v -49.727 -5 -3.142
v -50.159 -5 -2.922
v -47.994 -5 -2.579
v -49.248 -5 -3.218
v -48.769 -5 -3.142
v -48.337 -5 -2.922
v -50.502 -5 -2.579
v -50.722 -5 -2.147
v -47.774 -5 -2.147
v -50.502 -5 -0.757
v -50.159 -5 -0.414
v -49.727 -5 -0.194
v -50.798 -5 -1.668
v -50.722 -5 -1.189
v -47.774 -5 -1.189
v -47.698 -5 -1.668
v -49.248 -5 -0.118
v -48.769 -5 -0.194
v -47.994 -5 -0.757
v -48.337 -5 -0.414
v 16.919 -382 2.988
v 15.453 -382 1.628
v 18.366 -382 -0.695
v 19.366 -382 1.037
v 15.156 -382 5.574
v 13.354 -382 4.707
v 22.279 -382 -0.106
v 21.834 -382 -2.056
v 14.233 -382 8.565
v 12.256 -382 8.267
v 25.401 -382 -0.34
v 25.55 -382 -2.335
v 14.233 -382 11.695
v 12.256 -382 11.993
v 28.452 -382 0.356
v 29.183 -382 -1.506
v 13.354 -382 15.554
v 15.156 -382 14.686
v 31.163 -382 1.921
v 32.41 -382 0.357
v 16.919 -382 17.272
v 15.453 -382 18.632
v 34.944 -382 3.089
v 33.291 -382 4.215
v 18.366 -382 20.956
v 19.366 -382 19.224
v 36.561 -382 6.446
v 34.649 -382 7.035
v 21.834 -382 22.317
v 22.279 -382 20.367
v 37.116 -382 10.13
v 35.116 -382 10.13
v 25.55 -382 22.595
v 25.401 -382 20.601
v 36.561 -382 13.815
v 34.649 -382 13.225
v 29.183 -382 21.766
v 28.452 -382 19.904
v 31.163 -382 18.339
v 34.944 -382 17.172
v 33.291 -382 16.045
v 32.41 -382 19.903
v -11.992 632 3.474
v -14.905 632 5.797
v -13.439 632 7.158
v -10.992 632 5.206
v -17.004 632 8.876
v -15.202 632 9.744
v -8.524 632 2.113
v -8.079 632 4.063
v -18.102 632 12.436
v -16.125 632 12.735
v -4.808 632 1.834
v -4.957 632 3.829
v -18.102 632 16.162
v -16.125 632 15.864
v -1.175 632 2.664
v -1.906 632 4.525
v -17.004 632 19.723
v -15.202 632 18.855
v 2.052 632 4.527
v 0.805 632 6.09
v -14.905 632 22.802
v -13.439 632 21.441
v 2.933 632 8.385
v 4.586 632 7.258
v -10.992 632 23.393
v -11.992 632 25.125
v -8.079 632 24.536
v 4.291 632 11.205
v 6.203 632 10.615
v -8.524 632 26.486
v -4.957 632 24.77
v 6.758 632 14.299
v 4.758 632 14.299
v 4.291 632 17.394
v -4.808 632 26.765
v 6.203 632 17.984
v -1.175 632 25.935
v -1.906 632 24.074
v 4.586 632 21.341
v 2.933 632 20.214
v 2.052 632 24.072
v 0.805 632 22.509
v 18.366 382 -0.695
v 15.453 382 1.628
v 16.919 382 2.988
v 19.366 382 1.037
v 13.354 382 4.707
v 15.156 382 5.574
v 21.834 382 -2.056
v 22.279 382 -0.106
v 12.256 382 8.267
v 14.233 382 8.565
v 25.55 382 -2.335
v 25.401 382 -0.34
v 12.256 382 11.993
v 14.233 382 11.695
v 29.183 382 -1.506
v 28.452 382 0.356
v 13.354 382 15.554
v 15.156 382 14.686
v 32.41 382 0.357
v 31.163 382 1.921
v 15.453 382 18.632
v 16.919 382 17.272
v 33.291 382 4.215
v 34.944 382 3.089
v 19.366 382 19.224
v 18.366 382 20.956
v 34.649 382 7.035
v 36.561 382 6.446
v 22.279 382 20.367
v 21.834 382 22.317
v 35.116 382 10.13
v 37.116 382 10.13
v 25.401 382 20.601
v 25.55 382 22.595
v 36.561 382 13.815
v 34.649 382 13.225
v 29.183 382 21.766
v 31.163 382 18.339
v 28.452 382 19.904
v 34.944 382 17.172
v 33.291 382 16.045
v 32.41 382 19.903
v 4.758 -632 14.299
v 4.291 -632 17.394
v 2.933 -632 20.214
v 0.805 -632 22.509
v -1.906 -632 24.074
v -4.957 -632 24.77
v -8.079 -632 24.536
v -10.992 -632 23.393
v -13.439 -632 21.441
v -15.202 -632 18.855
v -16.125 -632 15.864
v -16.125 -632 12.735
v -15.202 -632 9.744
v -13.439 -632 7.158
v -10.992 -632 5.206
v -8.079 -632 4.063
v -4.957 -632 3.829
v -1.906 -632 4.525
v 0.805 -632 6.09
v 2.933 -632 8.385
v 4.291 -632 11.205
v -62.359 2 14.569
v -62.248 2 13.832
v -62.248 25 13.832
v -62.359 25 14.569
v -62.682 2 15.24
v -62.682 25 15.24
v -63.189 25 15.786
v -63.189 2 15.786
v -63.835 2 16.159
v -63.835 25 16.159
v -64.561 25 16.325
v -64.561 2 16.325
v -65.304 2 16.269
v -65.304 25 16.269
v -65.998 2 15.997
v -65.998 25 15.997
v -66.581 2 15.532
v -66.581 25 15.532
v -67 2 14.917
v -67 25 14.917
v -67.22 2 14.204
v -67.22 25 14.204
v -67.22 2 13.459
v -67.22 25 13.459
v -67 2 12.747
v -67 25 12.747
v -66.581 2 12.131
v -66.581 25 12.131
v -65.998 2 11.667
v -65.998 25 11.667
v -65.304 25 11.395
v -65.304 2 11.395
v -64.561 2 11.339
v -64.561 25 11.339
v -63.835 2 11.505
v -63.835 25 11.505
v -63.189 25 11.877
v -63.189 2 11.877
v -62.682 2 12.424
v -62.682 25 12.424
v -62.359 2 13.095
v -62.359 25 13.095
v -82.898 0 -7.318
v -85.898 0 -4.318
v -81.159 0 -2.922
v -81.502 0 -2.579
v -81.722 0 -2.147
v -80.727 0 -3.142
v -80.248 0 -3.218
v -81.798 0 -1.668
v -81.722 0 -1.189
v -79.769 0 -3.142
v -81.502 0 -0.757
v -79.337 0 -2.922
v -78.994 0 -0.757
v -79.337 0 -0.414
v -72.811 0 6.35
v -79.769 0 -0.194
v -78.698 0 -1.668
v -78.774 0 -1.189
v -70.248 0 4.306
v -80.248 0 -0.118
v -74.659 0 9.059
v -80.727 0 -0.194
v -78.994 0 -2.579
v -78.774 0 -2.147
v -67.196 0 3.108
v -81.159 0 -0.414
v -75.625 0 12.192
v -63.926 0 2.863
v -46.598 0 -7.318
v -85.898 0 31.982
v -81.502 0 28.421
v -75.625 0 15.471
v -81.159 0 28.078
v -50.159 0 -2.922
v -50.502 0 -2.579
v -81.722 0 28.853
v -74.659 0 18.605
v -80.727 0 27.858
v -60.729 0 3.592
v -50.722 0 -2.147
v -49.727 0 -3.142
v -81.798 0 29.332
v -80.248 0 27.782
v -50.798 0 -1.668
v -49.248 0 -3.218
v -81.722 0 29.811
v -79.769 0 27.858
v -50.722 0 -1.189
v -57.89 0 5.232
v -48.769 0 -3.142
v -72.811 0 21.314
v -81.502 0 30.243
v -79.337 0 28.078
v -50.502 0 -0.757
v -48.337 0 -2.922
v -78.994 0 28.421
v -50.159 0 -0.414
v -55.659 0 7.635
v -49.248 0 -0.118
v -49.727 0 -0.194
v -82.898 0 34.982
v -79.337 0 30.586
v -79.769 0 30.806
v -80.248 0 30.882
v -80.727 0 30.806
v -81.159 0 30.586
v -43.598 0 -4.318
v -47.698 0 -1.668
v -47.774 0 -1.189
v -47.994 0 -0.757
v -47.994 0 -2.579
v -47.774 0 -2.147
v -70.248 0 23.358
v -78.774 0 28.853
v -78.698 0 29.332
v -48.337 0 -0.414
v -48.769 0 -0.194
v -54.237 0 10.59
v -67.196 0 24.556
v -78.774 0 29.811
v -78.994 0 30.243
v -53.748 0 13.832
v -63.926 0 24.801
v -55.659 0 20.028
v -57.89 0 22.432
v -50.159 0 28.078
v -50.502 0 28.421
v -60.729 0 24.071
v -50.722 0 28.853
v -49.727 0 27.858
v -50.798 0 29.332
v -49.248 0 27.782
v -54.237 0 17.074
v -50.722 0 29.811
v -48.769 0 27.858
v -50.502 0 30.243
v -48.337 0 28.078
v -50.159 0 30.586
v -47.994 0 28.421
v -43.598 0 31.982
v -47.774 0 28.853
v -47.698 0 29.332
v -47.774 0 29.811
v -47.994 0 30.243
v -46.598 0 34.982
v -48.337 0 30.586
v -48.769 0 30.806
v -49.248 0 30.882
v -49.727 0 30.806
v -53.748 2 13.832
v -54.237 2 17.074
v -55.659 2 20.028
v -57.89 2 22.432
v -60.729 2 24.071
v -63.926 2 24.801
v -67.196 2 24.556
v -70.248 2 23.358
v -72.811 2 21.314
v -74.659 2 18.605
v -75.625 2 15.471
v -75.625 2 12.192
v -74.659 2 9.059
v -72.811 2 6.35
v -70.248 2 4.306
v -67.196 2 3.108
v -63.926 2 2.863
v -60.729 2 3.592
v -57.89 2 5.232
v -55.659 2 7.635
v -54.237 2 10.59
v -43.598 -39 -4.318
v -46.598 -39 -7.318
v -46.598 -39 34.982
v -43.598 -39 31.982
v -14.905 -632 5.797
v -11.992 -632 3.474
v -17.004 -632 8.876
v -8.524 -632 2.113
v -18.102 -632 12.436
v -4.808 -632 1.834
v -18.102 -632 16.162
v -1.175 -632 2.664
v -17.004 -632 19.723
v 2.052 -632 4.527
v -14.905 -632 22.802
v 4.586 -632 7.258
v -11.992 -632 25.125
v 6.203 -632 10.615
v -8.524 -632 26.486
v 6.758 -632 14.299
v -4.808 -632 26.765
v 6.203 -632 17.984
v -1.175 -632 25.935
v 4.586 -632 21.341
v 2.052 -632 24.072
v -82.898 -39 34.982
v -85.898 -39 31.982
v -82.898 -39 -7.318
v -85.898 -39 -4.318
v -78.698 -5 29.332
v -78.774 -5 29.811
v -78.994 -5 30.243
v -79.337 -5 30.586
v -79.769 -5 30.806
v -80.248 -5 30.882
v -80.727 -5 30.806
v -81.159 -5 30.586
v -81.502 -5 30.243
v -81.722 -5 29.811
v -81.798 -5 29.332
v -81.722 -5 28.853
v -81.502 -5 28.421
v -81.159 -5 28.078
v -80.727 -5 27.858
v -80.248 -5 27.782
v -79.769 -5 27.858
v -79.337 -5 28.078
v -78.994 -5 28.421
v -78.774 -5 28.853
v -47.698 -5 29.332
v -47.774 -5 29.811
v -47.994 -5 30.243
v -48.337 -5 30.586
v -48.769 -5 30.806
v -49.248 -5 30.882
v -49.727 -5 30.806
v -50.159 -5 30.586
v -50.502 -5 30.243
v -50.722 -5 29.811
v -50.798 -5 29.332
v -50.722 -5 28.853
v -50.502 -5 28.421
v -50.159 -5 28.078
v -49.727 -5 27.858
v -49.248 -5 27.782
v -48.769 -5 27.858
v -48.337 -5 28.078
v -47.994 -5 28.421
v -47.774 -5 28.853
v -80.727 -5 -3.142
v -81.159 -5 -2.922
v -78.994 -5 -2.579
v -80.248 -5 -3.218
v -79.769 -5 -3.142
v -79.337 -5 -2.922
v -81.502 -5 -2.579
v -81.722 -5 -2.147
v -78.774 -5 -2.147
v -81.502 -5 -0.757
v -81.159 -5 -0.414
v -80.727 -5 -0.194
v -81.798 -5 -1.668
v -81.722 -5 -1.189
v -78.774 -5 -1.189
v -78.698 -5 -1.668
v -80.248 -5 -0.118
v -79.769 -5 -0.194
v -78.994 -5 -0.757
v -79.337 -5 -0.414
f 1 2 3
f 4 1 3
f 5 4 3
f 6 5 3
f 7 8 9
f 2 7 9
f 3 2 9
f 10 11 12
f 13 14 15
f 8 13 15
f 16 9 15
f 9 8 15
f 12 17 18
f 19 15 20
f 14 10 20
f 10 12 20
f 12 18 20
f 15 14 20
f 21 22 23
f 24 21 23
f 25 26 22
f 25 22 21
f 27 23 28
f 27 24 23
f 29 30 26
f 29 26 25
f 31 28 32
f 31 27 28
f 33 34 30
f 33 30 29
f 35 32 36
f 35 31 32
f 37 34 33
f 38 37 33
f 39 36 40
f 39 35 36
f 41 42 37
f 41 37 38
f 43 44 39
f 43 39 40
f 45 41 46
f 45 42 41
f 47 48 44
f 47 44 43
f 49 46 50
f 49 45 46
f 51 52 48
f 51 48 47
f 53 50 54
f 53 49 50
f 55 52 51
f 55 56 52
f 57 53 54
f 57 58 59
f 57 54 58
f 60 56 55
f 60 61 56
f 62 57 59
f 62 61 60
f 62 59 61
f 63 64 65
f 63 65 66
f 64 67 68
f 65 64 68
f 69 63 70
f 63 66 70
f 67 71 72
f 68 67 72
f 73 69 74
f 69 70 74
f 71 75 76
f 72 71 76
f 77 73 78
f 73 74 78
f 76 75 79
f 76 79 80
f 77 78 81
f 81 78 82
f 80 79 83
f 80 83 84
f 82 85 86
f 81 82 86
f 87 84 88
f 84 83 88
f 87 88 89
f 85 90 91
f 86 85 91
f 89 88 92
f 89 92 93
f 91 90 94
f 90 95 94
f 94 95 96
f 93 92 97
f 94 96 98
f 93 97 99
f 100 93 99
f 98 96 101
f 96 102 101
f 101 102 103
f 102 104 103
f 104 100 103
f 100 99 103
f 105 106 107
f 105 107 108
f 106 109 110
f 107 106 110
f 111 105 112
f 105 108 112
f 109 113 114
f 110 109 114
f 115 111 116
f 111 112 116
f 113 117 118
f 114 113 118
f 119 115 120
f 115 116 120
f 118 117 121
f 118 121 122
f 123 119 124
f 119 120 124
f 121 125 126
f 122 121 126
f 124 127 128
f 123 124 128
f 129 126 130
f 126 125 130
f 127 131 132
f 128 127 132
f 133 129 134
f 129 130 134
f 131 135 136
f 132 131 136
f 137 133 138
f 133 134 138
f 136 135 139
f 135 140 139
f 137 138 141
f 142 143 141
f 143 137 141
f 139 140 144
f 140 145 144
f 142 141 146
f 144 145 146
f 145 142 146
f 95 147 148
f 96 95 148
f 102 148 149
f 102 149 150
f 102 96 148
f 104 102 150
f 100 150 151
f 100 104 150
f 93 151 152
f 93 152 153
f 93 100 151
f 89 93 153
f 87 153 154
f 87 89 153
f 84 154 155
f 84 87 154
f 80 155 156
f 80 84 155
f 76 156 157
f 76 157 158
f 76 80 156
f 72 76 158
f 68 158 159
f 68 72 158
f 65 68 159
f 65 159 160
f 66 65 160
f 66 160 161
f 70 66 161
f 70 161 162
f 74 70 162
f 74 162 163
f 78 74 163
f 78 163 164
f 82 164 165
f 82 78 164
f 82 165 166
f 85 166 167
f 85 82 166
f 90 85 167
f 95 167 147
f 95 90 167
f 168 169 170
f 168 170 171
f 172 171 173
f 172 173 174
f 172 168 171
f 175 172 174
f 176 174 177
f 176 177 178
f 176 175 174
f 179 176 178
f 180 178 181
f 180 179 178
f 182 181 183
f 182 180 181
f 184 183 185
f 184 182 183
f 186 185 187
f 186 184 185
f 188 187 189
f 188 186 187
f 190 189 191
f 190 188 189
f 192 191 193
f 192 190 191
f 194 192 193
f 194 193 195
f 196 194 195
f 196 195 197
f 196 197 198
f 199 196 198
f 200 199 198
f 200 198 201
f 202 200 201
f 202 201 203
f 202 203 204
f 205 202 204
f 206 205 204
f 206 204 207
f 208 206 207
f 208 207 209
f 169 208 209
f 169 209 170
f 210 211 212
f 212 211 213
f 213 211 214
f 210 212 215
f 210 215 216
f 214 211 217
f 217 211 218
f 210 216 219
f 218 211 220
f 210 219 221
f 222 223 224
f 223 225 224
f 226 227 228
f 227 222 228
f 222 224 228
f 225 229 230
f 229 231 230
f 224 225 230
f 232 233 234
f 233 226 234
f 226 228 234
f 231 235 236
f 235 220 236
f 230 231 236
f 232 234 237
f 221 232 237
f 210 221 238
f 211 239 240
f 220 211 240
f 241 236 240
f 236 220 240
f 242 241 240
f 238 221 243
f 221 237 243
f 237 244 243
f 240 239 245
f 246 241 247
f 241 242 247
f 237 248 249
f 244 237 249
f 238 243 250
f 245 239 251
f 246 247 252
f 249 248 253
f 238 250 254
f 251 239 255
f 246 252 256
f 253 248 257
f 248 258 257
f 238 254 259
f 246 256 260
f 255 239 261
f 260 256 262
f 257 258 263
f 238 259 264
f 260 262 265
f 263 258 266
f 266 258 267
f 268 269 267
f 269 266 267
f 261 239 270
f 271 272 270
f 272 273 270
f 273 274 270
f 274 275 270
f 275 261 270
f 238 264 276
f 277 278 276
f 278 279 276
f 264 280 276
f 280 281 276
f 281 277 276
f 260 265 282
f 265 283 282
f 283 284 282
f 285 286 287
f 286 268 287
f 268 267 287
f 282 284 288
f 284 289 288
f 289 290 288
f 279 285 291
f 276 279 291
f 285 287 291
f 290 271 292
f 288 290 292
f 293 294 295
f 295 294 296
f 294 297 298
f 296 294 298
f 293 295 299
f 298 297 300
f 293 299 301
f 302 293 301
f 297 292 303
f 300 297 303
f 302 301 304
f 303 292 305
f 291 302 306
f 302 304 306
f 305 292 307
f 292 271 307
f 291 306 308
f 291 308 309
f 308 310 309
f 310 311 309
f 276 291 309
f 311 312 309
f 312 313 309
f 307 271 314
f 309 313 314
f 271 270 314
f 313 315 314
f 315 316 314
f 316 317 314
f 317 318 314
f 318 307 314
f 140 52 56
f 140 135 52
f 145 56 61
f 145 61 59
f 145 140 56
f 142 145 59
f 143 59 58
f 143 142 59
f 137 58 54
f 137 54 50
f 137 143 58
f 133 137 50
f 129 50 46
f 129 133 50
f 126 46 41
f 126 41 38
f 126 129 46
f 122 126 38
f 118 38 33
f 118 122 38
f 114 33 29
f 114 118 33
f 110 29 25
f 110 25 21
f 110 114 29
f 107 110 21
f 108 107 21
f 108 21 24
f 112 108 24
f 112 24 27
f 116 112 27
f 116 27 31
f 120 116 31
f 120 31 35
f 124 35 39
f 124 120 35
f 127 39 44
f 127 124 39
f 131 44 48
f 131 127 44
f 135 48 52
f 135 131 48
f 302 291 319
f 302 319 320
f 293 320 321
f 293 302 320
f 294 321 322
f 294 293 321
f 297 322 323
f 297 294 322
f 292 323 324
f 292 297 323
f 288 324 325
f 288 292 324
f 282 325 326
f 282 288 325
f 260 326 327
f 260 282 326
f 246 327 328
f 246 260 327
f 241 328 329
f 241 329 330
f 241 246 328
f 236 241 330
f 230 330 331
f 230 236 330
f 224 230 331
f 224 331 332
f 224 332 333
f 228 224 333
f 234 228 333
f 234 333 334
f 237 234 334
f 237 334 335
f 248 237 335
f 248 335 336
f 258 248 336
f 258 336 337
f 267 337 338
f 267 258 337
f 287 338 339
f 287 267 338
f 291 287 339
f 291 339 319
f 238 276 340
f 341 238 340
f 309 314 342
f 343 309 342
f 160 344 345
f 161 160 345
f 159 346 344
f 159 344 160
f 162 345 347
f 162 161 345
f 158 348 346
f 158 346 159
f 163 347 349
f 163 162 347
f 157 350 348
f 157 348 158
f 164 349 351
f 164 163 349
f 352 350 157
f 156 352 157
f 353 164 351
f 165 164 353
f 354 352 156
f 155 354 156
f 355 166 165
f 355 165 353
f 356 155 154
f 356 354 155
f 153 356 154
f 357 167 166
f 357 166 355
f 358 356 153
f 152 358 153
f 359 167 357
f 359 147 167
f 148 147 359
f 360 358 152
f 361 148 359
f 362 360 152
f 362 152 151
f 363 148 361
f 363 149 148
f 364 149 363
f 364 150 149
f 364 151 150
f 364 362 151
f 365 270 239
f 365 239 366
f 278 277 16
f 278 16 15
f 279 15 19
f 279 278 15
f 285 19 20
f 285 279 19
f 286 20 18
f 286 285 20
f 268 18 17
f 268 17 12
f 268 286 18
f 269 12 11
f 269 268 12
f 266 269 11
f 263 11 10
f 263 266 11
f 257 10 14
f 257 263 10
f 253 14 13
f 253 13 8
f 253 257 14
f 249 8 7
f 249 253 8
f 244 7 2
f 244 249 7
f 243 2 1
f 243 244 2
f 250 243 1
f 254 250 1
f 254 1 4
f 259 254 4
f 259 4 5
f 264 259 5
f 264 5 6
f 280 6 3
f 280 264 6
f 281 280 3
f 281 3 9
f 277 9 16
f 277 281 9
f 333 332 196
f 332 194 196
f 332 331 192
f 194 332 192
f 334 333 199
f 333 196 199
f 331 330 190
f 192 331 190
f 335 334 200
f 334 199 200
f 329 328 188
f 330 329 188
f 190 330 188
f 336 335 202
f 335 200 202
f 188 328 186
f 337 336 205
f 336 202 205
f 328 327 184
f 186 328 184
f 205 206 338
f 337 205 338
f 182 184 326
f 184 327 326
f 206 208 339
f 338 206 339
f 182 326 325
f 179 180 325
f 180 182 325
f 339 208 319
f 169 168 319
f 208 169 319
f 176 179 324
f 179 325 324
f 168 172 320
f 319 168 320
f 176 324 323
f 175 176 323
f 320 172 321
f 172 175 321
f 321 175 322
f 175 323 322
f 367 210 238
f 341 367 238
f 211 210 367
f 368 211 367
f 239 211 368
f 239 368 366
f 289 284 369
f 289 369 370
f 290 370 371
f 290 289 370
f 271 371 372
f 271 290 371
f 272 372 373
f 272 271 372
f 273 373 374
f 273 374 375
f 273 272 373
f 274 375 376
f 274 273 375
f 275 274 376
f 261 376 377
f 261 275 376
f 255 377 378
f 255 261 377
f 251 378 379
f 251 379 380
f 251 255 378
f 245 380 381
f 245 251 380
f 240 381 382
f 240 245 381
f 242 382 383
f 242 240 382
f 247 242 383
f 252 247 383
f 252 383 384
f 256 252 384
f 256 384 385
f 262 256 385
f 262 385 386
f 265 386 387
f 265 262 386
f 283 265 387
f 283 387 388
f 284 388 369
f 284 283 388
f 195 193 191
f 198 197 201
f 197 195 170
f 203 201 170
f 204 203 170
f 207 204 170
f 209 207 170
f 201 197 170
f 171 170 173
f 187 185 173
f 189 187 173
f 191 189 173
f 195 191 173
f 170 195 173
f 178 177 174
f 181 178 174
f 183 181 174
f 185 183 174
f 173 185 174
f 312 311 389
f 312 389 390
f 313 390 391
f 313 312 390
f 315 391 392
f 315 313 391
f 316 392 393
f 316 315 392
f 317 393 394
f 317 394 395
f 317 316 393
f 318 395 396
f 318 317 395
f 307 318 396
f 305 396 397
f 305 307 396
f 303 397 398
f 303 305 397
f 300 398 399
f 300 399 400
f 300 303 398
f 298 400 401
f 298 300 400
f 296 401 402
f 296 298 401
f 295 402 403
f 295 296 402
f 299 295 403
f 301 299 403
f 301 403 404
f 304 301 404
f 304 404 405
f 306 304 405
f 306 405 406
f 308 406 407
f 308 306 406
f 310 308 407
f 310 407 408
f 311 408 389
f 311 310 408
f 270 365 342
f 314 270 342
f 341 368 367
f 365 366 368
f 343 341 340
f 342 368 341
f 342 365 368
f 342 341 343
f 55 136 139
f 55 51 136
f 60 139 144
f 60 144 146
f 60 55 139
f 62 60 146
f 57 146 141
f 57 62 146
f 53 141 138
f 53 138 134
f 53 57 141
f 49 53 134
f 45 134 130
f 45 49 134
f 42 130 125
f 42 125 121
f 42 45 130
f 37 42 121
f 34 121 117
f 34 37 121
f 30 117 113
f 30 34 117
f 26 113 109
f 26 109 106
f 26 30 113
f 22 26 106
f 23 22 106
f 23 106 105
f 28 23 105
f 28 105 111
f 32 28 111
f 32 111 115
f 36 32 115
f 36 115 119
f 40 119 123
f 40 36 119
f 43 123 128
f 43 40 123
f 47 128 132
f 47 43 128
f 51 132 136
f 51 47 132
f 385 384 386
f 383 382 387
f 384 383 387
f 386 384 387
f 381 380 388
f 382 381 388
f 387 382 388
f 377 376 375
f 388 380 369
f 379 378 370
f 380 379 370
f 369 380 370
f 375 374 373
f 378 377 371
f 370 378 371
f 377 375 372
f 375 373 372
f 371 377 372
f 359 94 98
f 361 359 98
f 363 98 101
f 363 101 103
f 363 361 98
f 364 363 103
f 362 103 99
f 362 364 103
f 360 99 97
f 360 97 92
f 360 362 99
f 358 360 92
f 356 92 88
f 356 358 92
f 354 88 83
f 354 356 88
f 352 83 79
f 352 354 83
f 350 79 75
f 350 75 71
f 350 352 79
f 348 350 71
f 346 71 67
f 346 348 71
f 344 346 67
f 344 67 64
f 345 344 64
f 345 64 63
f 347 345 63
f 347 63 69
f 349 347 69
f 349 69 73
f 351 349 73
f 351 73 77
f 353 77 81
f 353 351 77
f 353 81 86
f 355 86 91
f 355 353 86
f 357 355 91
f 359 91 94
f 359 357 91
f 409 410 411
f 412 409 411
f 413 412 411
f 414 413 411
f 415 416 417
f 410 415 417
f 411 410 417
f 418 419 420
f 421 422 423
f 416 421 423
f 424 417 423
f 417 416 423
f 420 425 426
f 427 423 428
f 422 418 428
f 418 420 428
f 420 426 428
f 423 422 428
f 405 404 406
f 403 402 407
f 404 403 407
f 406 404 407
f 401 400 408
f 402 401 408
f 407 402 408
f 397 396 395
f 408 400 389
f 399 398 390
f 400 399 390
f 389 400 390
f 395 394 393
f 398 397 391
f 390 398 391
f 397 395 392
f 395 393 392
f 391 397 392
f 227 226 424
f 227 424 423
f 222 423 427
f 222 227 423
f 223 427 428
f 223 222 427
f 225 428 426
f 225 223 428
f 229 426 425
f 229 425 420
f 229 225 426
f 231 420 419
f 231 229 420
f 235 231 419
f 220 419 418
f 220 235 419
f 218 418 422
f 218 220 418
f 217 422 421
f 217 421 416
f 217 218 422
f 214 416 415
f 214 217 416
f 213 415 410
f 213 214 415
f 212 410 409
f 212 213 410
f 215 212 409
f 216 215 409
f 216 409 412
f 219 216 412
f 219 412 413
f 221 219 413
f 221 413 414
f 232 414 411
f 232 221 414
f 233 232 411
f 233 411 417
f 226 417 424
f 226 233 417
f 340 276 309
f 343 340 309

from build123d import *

# Parameters (mm, degrees)
F0_W     = 42.3
F0_H     = 42.3
F0_R     = 1.55
F0_R_2   = 11
F0_R_3   = 2.5
F1_DEPTH = 39
F2_SIZE  = 3
F3_DEPTH = 5
F4_DEPTH = 25
F5_R     = 12.5
F5_R_2   = 10.5
F6_DEPTH = 632
F7_R     = 12.5
F7_R_2   = 10.5
F8_DEPTH = 382
F9_DEPTH = 2


with BuildPart() as f1:
    # F0 (on Front) → F1 (new body)
    with BuildSketch(Plane.XZ):
        with Locations((-64.747915, 13.83183)):
            Rectangle(F0_W, F0_H)
        with Locations((-80.247915, -1.66817)):
            Circle(F0_R, mode=Mode.SUBTRACT)
        with Locations((-49.247915, -1.66817)):
            Circle(F0_R, mode=Mode.SUBTRACT)
        with Locations((-64.747915, 13.83183)):
            Circle(F0_R_2, mode=Mode.SUBTRACT)
        with Locations((-80.247915, 29.33183)):
            Circle(F0_R, mode=Mode.SUBTRACT)
        with Locations((-49.247915, 29.33183)):
            Circle(F0_R, mode=Mode.SUBTRACT)
        with Locations((-49.247915, 29.33183)):
            Circle(F0_R)
        with Locations((-49.247915, -1.66817)):
            Circle(F0_R)
        with Locations((-80.247915, -1.66817)):
            Circle(F0_R)
        with Locations((-80.247915, 29.33183)):
            Circle(F0_R)
        with Locations((-64.747915, 13.83183)):
            Circle(F0_R_2)
        with Locations((-64.747915, 13.83183)):
            Circle(F0_R_3, mode=Mode.SUBTRACT)
        with Locations((-64.747915, 13.83183)):
            Circle(F0_R_3)
    extrude(amount=F1_DEPTH)

    # F2
    f2_edges = [f1.edges().sort_by_distance(p)[0] for p in [
        (-43.597915, -19.5, 34.98183),
        (-85.897915, -19.5, 34.98183),
        (-43.597915, -19.5, -7.31817),
        (-85.897915, -19.5, -7.31817),
    ]]
    chamfer(f2_edges, length=F2_SIZE)

    # F0 (on Front) → F3 (cut)
    with BuildSketch(Plane.XZ):
        with Locations((-49.247915, 29.33183)):
            Circle(F0_R)
        with Locations((-80.247915, 29.33183)):
            Circle(F0_R)
        with Locations((-80.247915, -1.66817)):
            Circle(F0_R)
        with Locations((-49.247915, -1.66817)):
            Circle(F0_R)
    extrude(amount=F3_DEPTH, mode=Mode.SUBTRACT)

    # F0 (on Front) → F4 (join)
    with BuildSketch(Plane.XZ):
        with Locations((-64.747915, 13.83183)):
            Circle(F0_R_3)
    extrude(amount=-F4_DEPTH)

    # F0 (on Front) → F9 (join)
    with BuildSketch(Plane.XZ):
        with Locations((-64.747915, 13.83183)):
            Circle(F0_R_2)
        with Locations((-64.747915, 13.83183)):
            Circle(F0_R_3, mode=Mode.SUBTRACT)
    extrude(amount=-F9_DEPTH)


with BuildPart() as f6:
    # F5 (on Front) → F6 (new body, symmetric)
    with BuildSketch(Plane.XZ):
        with Locations((-5.742102, 14.29946)):
            Circle(F5_R)
        with Locations((-5.742102, 14.29946)):
            Circle(F5_R_2, mode=Mode.SUBTRACT)
    extrude(amount=F6_DEPTH, both=True)


with BuildPart() as f8:
    # F7 (on Front) → F8 (new body, symmetric)
    with BuildSketch(Plane.XZ):
        with Locations((24.615914, 10.130254)):
            Circle(F7_R)
        with Locations((24.615914, 10.130254)):
            Circle(F7_R_2, mode=Mode.SUBTRACT)
    extrude(amount=F8_DEPTH, both=True)


solid = Compound([f1.part, f6.part, f8.part])
